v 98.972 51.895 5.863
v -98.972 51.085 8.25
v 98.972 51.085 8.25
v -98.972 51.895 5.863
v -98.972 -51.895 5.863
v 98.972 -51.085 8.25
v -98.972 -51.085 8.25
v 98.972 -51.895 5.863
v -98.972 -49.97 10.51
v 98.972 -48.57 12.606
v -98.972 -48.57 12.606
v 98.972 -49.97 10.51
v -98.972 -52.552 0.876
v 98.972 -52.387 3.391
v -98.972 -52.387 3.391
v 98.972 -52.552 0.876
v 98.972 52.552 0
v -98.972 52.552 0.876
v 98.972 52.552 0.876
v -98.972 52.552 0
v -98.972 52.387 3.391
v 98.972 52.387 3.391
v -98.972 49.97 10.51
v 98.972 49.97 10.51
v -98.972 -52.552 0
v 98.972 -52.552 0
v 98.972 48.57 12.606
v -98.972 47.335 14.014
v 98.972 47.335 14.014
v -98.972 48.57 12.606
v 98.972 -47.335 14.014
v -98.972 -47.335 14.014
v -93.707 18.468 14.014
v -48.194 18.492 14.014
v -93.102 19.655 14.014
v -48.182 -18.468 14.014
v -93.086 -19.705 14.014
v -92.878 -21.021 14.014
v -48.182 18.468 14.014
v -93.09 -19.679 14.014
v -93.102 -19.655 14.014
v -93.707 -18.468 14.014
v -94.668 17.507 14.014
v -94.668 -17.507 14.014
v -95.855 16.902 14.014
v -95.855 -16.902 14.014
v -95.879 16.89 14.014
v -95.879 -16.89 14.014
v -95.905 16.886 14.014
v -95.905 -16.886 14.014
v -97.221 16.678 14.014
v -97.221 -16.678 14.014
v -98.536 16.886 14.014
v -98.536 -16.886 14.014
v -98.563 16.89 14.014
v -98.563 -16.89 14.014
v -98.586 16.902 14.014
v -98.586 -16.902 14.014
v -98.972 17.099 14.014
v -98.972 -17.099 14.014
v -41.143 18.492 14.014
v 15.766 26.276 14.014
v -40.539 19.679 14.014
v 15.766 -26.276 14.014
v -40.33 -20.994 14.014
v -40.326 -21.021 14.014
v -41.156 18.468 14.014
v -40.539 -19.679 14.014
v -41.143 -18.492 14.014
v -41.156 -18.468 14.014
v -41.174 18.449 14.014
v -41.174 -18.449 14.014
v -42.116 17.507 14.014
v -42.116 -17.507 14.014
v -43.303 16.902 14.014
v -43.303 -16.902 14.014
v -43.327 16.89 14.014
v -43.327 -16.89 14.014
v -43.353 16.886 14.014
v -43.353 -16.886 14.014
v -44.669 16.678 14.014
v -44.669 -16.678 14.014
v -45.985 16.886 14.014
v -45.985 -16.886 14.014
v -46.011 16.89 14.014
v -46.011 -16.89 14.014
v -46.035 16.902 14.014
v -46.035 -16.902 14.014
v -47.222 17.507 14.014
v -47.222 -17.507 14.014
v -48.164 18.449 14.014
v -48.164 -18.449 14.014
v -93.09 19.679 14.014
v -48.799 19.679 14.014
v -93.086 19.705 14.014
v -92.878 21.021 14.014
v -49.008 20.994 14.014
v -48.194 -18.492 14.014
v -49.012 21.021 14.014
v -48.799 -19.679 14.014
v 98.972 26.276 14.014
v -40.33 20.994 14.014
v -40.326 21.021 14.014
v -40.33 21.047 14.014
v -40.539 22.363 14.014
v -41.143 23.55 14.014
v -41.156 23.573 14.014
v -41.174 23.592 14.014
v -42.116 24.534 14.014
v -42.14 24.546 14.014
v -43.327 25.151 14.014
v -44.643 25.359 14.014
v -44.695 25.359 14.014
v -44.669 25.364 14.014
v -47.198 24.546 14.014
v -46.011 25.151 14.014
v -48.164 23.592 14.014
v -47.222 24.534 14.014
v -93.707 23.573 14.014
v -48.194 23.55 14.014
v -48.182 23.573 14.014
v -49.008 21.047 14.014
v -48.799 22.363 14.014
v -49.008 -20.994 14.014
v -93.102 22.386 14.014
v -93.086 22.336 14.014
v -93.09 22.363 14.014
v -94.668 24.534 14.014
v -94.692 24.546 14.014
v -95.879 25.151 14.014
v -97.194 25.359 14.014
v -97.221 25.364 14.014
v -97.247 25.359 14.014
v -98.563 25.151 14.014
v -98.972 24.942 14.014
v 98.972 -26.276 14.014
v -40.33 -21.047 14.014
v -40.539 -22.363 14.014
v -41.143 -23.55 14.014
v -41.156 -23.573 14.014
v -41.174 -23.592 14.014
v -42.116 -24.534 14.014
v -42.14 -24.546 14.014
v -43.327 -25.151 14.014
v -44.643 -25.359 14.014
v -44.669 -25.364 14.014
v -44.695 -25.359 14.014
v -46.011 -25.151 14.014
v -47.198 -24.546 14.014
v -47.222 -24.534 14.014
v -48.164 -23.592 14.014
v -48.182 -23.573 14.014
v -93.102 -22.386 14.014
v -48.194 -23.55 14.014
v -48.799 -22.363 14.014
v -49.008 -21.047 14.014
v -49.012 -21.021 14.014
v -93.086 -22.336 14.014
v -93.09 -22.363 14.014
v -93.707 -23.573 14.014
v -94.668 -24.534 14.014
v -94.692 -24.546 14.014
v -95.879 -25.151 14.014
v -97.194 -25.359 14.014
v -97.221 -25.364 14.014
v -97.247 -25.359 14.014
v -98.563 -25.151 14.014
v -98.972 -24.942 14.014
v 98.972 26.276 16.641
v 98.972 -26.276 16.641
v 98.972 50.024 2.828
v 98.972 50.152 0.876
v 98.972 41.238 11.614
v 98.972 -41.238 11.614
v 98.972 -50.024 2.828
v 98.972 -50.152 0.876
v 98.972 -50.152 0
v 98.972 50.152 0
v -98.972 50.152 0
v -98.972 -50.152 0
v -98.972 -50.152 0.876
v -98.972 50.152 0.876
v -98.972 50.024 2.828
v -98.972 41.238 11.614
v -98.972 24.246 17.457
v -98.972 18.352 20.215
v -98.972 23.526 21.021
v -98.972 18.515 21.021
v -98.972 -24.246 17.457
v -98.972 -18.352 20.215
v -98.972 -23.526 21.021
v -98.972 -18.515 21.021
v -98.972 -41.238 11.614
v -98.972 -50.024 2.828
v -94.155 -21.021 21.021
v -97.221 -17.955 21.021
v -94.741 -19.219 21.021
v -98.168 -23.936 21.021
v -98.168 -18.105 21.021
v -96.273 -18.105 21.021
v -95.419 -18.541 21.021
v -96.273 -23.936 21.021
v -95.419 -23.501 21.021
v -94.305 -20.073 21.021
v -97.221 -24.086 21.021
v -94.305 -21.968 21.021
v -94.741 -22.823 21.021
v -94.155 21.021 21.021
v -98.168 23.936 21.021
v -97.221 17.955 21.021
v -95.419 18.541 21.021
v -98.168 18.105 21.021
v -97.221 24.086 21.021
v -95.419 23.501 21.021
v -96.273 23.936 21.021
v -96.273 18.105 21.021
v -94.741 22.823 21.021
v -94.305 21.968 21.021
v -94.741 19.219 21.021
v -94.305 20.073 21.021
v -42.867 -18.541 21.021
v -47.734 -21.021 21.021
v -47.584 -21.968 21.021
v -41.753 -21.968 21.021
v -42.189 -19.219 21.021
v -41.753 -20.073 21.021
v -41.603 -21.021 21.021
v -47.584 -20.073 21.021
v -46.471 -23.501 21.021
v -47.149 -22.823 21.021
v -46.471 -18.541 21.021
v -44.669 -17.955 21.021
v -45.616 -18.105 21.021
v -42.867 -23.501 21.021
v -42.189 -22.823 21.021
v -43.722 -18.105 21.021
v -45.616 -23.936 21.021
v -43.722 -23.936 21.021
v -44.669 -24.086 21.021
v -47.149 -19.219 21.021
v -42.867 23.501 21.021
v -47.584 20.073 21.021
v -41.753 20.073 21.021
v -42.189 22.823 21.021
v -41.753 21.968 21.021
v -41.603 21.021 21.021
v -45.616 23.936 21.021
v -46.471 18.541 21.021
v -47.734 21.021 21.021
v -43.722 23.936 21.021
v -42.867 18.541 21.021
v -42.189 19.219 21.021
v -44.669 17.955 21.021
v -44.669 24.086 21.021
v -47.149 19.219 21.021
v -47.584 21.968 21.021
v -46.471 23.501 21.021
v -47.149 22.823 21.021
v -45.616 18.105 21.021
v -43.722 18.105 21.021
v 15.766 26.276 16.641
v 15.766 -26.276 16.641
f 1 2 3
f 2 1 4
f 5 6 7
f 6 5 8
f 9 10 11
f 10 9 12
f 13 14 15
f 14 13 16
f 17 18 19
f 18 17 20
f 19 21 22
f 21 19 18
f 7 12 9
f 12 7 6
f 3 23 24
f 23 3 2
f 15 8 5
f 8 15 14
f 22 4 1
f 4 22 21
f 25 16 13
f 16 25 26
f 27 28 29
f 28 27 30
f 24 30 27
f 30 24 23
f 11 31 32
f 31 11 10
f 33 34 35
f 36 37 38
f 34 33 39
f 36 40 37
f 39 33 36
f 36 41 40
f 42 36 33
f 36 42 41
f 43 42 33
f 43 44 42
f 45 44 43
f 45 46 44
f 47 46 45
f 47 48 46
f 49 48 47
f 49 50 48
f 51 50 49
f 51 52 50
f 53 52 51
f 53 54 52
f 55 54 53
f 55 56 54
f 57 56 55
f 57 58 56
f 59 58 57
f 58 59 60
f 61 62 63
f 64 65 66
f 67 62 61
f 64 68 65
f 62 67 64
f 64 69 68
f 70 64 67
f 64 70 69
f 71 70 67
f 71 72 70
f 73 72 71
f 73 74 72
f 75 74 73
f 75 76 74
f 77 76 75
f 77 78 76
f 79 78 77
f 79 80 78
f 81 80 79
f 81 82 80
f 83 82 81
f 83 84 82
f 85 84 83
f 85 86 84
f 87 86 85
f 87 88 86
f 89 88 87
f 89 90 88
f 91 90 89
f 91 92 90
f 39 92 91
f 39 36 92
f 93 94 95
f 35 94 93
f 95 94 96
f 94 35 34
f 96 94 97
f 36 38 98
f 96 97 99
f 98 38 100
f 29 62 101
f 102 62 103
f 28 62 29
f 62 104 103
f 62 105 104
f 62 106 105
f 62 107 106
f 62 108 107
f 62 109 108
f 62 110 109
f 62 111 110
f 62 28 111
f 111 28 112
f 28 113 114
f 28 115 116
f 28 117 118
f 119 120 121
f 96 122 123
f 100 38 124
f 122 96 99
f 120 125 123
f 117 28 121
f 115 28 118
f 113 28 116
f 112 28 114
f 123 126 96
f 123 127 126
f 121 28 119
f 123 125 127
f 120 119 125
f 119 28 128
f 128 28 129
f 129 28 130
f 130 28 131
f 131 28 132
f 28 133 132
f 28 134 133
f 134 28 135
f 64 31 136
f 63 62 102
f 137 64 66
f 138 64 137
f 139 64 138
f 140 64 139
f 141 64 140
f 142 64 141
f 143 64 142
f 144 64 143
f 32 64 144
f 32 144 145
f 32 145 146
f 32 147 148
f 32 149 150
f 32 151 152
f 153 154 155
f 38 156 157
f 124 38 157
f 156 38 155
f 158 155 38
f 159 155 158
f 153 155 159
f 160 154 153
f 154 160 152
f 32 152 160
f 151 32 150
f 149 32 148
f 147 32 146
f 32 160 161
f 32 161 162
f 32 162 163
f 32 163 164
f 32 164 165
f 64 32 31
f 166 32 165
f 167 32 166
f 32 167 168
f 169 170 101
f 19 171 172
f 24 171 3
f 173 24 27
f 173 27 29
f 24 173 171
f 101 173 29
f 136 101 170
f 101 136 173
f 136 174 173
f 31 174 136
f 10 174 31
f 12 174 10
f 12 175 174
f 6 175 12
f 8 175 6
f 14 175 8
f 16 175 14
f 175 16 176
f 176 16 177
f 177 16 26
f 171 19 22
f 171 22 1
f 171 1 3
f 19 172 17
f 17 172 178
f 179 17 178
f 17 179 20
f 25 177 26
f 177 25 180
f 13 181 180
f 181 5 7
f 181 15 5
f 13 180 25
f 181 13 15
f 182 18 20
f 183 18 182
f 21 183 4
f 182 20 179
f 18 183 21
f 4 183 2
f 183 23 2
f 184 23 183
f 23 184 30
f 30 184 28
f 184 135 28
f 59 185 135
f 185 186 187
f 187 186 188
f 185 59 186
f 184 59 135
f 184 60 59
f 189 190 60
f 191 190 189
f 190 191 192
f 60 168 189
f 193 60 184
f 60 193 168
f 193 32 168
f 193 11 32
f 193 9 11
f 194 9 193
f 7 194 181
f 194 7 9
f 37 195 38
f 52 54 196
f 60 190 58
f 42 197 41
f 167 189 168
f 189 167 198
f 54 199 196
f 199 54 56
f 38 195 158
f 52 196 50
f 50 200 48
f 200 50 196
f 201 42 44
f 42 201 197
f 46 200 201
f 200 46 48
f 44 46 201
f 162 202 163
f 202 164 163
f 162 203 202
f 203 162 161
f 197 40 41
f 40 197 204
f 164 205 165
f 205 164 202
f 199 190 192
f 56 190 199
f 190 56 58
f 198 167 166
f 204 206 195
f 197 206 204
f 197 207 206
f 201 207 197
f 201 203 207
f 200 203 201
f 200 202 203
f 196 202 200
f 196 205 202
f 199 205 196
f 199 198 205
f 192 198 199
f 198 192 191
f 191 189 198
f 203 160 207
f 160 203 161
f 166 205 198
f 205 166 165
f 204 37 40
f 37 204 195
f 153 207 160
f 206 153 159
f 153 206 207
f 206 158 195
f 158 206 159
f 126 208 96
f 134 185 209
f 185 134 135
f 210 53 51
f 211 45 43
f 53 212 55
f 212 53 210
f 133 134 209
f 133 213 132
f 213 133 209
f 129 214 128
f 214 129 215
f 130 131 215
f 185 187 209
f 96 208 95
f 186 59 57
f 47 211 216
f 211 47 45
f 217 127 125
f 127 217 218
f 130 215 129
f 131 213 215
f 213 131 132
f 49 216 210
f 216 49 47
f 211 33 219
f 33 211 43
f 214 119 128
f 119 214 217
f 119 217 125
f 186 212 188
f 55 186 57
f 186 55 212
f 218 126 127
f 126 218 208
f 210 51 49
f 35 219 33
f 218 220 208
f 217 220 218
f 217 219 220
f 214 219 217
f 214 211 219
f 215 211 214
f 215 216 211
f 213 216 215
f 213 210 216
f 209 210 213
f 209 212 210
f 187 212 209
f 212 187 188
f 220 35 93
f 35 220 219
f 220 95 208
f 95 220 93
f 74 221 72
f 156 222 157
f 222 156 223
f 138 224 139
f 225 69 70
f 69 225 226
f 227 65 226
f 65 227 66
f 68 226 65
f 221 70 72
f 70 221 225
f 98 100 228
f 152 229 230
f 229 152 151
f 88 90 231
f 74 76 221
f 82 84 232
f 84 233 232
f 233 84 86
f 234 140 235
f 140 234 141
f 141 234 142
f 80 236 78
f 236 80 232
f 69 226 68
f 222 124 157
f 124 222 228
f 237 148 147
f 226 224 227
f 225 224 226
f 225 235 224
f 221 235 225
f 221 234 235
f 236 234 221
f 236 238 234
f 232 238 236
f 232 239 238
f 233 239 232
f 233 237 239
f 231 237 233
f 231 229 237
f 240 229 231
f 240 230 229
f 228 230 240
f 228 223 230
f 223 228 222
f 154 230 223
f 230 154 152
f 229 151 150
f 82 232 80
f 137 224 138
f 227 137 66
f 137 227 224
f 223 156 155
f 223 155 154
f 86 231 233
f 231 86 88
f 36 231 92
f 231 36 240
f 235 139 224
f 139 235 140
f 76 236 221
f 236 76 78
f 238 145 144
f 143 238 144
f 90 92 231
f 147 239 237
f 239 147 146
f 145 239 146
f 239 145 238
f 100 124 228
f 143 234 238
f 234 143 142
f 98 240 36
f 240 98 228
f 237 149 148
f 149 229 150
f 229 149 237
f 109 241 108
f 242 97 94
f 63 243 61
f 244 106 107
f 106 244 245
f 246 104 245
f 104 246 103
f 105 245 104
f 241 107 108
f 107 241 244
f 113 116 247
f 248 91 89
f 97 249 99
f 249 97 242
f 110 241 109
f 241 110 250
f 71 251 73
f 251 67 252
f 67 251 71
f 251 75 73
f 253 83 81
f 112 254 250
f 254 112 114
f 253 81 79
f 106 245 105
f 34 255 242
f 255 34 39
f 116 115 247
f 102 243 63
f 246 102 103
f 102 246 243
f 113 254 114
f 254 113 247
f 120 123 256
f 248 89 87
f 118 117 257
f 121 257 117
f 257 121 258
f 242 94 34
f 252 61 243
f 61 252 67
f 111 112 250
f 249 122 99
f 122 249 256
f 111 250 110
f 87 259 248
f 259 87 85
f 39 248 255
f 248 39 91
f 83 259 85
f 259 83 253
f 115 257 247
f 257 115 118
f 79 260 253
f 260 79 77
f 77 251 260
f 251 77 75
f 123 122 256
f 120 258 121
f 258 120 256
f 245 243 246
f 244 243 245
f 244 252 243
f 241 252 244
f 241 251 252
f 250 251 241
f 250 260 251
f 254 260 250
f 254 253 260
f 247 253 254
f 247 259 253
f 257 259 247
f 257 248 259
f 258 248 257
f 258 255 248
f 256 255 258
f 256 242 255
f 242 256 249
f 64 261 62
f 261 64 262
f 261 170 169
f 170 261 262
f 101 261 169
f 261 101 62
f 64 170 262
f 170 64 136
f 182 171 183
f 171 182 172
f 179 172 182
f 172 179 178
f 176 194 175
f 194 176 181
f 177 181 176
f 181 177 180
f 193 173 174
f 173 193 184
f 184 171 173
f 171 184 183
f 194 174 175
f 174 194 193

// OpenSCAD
// Milwaukee Road Little Joe, G scale 1-29 - print 6 of 20: roof_2 - roof, section 2 (print upright)
// Render (F6), export STL, print. Settings: ../../library/lj_params.scad
// Whole loco preview and notes: ../../MILW_LittleJoe_Main.scad
SCALE_SEL = "G";
LOCO_SEL = "E70";   // [E20, E21, E70, E71, E72, E73, E74, E75, E76, E77, E78, E79] the body and roof change for E20 / E21
include <../../library/lj_all.scad>
lj_plate("roof_2");
